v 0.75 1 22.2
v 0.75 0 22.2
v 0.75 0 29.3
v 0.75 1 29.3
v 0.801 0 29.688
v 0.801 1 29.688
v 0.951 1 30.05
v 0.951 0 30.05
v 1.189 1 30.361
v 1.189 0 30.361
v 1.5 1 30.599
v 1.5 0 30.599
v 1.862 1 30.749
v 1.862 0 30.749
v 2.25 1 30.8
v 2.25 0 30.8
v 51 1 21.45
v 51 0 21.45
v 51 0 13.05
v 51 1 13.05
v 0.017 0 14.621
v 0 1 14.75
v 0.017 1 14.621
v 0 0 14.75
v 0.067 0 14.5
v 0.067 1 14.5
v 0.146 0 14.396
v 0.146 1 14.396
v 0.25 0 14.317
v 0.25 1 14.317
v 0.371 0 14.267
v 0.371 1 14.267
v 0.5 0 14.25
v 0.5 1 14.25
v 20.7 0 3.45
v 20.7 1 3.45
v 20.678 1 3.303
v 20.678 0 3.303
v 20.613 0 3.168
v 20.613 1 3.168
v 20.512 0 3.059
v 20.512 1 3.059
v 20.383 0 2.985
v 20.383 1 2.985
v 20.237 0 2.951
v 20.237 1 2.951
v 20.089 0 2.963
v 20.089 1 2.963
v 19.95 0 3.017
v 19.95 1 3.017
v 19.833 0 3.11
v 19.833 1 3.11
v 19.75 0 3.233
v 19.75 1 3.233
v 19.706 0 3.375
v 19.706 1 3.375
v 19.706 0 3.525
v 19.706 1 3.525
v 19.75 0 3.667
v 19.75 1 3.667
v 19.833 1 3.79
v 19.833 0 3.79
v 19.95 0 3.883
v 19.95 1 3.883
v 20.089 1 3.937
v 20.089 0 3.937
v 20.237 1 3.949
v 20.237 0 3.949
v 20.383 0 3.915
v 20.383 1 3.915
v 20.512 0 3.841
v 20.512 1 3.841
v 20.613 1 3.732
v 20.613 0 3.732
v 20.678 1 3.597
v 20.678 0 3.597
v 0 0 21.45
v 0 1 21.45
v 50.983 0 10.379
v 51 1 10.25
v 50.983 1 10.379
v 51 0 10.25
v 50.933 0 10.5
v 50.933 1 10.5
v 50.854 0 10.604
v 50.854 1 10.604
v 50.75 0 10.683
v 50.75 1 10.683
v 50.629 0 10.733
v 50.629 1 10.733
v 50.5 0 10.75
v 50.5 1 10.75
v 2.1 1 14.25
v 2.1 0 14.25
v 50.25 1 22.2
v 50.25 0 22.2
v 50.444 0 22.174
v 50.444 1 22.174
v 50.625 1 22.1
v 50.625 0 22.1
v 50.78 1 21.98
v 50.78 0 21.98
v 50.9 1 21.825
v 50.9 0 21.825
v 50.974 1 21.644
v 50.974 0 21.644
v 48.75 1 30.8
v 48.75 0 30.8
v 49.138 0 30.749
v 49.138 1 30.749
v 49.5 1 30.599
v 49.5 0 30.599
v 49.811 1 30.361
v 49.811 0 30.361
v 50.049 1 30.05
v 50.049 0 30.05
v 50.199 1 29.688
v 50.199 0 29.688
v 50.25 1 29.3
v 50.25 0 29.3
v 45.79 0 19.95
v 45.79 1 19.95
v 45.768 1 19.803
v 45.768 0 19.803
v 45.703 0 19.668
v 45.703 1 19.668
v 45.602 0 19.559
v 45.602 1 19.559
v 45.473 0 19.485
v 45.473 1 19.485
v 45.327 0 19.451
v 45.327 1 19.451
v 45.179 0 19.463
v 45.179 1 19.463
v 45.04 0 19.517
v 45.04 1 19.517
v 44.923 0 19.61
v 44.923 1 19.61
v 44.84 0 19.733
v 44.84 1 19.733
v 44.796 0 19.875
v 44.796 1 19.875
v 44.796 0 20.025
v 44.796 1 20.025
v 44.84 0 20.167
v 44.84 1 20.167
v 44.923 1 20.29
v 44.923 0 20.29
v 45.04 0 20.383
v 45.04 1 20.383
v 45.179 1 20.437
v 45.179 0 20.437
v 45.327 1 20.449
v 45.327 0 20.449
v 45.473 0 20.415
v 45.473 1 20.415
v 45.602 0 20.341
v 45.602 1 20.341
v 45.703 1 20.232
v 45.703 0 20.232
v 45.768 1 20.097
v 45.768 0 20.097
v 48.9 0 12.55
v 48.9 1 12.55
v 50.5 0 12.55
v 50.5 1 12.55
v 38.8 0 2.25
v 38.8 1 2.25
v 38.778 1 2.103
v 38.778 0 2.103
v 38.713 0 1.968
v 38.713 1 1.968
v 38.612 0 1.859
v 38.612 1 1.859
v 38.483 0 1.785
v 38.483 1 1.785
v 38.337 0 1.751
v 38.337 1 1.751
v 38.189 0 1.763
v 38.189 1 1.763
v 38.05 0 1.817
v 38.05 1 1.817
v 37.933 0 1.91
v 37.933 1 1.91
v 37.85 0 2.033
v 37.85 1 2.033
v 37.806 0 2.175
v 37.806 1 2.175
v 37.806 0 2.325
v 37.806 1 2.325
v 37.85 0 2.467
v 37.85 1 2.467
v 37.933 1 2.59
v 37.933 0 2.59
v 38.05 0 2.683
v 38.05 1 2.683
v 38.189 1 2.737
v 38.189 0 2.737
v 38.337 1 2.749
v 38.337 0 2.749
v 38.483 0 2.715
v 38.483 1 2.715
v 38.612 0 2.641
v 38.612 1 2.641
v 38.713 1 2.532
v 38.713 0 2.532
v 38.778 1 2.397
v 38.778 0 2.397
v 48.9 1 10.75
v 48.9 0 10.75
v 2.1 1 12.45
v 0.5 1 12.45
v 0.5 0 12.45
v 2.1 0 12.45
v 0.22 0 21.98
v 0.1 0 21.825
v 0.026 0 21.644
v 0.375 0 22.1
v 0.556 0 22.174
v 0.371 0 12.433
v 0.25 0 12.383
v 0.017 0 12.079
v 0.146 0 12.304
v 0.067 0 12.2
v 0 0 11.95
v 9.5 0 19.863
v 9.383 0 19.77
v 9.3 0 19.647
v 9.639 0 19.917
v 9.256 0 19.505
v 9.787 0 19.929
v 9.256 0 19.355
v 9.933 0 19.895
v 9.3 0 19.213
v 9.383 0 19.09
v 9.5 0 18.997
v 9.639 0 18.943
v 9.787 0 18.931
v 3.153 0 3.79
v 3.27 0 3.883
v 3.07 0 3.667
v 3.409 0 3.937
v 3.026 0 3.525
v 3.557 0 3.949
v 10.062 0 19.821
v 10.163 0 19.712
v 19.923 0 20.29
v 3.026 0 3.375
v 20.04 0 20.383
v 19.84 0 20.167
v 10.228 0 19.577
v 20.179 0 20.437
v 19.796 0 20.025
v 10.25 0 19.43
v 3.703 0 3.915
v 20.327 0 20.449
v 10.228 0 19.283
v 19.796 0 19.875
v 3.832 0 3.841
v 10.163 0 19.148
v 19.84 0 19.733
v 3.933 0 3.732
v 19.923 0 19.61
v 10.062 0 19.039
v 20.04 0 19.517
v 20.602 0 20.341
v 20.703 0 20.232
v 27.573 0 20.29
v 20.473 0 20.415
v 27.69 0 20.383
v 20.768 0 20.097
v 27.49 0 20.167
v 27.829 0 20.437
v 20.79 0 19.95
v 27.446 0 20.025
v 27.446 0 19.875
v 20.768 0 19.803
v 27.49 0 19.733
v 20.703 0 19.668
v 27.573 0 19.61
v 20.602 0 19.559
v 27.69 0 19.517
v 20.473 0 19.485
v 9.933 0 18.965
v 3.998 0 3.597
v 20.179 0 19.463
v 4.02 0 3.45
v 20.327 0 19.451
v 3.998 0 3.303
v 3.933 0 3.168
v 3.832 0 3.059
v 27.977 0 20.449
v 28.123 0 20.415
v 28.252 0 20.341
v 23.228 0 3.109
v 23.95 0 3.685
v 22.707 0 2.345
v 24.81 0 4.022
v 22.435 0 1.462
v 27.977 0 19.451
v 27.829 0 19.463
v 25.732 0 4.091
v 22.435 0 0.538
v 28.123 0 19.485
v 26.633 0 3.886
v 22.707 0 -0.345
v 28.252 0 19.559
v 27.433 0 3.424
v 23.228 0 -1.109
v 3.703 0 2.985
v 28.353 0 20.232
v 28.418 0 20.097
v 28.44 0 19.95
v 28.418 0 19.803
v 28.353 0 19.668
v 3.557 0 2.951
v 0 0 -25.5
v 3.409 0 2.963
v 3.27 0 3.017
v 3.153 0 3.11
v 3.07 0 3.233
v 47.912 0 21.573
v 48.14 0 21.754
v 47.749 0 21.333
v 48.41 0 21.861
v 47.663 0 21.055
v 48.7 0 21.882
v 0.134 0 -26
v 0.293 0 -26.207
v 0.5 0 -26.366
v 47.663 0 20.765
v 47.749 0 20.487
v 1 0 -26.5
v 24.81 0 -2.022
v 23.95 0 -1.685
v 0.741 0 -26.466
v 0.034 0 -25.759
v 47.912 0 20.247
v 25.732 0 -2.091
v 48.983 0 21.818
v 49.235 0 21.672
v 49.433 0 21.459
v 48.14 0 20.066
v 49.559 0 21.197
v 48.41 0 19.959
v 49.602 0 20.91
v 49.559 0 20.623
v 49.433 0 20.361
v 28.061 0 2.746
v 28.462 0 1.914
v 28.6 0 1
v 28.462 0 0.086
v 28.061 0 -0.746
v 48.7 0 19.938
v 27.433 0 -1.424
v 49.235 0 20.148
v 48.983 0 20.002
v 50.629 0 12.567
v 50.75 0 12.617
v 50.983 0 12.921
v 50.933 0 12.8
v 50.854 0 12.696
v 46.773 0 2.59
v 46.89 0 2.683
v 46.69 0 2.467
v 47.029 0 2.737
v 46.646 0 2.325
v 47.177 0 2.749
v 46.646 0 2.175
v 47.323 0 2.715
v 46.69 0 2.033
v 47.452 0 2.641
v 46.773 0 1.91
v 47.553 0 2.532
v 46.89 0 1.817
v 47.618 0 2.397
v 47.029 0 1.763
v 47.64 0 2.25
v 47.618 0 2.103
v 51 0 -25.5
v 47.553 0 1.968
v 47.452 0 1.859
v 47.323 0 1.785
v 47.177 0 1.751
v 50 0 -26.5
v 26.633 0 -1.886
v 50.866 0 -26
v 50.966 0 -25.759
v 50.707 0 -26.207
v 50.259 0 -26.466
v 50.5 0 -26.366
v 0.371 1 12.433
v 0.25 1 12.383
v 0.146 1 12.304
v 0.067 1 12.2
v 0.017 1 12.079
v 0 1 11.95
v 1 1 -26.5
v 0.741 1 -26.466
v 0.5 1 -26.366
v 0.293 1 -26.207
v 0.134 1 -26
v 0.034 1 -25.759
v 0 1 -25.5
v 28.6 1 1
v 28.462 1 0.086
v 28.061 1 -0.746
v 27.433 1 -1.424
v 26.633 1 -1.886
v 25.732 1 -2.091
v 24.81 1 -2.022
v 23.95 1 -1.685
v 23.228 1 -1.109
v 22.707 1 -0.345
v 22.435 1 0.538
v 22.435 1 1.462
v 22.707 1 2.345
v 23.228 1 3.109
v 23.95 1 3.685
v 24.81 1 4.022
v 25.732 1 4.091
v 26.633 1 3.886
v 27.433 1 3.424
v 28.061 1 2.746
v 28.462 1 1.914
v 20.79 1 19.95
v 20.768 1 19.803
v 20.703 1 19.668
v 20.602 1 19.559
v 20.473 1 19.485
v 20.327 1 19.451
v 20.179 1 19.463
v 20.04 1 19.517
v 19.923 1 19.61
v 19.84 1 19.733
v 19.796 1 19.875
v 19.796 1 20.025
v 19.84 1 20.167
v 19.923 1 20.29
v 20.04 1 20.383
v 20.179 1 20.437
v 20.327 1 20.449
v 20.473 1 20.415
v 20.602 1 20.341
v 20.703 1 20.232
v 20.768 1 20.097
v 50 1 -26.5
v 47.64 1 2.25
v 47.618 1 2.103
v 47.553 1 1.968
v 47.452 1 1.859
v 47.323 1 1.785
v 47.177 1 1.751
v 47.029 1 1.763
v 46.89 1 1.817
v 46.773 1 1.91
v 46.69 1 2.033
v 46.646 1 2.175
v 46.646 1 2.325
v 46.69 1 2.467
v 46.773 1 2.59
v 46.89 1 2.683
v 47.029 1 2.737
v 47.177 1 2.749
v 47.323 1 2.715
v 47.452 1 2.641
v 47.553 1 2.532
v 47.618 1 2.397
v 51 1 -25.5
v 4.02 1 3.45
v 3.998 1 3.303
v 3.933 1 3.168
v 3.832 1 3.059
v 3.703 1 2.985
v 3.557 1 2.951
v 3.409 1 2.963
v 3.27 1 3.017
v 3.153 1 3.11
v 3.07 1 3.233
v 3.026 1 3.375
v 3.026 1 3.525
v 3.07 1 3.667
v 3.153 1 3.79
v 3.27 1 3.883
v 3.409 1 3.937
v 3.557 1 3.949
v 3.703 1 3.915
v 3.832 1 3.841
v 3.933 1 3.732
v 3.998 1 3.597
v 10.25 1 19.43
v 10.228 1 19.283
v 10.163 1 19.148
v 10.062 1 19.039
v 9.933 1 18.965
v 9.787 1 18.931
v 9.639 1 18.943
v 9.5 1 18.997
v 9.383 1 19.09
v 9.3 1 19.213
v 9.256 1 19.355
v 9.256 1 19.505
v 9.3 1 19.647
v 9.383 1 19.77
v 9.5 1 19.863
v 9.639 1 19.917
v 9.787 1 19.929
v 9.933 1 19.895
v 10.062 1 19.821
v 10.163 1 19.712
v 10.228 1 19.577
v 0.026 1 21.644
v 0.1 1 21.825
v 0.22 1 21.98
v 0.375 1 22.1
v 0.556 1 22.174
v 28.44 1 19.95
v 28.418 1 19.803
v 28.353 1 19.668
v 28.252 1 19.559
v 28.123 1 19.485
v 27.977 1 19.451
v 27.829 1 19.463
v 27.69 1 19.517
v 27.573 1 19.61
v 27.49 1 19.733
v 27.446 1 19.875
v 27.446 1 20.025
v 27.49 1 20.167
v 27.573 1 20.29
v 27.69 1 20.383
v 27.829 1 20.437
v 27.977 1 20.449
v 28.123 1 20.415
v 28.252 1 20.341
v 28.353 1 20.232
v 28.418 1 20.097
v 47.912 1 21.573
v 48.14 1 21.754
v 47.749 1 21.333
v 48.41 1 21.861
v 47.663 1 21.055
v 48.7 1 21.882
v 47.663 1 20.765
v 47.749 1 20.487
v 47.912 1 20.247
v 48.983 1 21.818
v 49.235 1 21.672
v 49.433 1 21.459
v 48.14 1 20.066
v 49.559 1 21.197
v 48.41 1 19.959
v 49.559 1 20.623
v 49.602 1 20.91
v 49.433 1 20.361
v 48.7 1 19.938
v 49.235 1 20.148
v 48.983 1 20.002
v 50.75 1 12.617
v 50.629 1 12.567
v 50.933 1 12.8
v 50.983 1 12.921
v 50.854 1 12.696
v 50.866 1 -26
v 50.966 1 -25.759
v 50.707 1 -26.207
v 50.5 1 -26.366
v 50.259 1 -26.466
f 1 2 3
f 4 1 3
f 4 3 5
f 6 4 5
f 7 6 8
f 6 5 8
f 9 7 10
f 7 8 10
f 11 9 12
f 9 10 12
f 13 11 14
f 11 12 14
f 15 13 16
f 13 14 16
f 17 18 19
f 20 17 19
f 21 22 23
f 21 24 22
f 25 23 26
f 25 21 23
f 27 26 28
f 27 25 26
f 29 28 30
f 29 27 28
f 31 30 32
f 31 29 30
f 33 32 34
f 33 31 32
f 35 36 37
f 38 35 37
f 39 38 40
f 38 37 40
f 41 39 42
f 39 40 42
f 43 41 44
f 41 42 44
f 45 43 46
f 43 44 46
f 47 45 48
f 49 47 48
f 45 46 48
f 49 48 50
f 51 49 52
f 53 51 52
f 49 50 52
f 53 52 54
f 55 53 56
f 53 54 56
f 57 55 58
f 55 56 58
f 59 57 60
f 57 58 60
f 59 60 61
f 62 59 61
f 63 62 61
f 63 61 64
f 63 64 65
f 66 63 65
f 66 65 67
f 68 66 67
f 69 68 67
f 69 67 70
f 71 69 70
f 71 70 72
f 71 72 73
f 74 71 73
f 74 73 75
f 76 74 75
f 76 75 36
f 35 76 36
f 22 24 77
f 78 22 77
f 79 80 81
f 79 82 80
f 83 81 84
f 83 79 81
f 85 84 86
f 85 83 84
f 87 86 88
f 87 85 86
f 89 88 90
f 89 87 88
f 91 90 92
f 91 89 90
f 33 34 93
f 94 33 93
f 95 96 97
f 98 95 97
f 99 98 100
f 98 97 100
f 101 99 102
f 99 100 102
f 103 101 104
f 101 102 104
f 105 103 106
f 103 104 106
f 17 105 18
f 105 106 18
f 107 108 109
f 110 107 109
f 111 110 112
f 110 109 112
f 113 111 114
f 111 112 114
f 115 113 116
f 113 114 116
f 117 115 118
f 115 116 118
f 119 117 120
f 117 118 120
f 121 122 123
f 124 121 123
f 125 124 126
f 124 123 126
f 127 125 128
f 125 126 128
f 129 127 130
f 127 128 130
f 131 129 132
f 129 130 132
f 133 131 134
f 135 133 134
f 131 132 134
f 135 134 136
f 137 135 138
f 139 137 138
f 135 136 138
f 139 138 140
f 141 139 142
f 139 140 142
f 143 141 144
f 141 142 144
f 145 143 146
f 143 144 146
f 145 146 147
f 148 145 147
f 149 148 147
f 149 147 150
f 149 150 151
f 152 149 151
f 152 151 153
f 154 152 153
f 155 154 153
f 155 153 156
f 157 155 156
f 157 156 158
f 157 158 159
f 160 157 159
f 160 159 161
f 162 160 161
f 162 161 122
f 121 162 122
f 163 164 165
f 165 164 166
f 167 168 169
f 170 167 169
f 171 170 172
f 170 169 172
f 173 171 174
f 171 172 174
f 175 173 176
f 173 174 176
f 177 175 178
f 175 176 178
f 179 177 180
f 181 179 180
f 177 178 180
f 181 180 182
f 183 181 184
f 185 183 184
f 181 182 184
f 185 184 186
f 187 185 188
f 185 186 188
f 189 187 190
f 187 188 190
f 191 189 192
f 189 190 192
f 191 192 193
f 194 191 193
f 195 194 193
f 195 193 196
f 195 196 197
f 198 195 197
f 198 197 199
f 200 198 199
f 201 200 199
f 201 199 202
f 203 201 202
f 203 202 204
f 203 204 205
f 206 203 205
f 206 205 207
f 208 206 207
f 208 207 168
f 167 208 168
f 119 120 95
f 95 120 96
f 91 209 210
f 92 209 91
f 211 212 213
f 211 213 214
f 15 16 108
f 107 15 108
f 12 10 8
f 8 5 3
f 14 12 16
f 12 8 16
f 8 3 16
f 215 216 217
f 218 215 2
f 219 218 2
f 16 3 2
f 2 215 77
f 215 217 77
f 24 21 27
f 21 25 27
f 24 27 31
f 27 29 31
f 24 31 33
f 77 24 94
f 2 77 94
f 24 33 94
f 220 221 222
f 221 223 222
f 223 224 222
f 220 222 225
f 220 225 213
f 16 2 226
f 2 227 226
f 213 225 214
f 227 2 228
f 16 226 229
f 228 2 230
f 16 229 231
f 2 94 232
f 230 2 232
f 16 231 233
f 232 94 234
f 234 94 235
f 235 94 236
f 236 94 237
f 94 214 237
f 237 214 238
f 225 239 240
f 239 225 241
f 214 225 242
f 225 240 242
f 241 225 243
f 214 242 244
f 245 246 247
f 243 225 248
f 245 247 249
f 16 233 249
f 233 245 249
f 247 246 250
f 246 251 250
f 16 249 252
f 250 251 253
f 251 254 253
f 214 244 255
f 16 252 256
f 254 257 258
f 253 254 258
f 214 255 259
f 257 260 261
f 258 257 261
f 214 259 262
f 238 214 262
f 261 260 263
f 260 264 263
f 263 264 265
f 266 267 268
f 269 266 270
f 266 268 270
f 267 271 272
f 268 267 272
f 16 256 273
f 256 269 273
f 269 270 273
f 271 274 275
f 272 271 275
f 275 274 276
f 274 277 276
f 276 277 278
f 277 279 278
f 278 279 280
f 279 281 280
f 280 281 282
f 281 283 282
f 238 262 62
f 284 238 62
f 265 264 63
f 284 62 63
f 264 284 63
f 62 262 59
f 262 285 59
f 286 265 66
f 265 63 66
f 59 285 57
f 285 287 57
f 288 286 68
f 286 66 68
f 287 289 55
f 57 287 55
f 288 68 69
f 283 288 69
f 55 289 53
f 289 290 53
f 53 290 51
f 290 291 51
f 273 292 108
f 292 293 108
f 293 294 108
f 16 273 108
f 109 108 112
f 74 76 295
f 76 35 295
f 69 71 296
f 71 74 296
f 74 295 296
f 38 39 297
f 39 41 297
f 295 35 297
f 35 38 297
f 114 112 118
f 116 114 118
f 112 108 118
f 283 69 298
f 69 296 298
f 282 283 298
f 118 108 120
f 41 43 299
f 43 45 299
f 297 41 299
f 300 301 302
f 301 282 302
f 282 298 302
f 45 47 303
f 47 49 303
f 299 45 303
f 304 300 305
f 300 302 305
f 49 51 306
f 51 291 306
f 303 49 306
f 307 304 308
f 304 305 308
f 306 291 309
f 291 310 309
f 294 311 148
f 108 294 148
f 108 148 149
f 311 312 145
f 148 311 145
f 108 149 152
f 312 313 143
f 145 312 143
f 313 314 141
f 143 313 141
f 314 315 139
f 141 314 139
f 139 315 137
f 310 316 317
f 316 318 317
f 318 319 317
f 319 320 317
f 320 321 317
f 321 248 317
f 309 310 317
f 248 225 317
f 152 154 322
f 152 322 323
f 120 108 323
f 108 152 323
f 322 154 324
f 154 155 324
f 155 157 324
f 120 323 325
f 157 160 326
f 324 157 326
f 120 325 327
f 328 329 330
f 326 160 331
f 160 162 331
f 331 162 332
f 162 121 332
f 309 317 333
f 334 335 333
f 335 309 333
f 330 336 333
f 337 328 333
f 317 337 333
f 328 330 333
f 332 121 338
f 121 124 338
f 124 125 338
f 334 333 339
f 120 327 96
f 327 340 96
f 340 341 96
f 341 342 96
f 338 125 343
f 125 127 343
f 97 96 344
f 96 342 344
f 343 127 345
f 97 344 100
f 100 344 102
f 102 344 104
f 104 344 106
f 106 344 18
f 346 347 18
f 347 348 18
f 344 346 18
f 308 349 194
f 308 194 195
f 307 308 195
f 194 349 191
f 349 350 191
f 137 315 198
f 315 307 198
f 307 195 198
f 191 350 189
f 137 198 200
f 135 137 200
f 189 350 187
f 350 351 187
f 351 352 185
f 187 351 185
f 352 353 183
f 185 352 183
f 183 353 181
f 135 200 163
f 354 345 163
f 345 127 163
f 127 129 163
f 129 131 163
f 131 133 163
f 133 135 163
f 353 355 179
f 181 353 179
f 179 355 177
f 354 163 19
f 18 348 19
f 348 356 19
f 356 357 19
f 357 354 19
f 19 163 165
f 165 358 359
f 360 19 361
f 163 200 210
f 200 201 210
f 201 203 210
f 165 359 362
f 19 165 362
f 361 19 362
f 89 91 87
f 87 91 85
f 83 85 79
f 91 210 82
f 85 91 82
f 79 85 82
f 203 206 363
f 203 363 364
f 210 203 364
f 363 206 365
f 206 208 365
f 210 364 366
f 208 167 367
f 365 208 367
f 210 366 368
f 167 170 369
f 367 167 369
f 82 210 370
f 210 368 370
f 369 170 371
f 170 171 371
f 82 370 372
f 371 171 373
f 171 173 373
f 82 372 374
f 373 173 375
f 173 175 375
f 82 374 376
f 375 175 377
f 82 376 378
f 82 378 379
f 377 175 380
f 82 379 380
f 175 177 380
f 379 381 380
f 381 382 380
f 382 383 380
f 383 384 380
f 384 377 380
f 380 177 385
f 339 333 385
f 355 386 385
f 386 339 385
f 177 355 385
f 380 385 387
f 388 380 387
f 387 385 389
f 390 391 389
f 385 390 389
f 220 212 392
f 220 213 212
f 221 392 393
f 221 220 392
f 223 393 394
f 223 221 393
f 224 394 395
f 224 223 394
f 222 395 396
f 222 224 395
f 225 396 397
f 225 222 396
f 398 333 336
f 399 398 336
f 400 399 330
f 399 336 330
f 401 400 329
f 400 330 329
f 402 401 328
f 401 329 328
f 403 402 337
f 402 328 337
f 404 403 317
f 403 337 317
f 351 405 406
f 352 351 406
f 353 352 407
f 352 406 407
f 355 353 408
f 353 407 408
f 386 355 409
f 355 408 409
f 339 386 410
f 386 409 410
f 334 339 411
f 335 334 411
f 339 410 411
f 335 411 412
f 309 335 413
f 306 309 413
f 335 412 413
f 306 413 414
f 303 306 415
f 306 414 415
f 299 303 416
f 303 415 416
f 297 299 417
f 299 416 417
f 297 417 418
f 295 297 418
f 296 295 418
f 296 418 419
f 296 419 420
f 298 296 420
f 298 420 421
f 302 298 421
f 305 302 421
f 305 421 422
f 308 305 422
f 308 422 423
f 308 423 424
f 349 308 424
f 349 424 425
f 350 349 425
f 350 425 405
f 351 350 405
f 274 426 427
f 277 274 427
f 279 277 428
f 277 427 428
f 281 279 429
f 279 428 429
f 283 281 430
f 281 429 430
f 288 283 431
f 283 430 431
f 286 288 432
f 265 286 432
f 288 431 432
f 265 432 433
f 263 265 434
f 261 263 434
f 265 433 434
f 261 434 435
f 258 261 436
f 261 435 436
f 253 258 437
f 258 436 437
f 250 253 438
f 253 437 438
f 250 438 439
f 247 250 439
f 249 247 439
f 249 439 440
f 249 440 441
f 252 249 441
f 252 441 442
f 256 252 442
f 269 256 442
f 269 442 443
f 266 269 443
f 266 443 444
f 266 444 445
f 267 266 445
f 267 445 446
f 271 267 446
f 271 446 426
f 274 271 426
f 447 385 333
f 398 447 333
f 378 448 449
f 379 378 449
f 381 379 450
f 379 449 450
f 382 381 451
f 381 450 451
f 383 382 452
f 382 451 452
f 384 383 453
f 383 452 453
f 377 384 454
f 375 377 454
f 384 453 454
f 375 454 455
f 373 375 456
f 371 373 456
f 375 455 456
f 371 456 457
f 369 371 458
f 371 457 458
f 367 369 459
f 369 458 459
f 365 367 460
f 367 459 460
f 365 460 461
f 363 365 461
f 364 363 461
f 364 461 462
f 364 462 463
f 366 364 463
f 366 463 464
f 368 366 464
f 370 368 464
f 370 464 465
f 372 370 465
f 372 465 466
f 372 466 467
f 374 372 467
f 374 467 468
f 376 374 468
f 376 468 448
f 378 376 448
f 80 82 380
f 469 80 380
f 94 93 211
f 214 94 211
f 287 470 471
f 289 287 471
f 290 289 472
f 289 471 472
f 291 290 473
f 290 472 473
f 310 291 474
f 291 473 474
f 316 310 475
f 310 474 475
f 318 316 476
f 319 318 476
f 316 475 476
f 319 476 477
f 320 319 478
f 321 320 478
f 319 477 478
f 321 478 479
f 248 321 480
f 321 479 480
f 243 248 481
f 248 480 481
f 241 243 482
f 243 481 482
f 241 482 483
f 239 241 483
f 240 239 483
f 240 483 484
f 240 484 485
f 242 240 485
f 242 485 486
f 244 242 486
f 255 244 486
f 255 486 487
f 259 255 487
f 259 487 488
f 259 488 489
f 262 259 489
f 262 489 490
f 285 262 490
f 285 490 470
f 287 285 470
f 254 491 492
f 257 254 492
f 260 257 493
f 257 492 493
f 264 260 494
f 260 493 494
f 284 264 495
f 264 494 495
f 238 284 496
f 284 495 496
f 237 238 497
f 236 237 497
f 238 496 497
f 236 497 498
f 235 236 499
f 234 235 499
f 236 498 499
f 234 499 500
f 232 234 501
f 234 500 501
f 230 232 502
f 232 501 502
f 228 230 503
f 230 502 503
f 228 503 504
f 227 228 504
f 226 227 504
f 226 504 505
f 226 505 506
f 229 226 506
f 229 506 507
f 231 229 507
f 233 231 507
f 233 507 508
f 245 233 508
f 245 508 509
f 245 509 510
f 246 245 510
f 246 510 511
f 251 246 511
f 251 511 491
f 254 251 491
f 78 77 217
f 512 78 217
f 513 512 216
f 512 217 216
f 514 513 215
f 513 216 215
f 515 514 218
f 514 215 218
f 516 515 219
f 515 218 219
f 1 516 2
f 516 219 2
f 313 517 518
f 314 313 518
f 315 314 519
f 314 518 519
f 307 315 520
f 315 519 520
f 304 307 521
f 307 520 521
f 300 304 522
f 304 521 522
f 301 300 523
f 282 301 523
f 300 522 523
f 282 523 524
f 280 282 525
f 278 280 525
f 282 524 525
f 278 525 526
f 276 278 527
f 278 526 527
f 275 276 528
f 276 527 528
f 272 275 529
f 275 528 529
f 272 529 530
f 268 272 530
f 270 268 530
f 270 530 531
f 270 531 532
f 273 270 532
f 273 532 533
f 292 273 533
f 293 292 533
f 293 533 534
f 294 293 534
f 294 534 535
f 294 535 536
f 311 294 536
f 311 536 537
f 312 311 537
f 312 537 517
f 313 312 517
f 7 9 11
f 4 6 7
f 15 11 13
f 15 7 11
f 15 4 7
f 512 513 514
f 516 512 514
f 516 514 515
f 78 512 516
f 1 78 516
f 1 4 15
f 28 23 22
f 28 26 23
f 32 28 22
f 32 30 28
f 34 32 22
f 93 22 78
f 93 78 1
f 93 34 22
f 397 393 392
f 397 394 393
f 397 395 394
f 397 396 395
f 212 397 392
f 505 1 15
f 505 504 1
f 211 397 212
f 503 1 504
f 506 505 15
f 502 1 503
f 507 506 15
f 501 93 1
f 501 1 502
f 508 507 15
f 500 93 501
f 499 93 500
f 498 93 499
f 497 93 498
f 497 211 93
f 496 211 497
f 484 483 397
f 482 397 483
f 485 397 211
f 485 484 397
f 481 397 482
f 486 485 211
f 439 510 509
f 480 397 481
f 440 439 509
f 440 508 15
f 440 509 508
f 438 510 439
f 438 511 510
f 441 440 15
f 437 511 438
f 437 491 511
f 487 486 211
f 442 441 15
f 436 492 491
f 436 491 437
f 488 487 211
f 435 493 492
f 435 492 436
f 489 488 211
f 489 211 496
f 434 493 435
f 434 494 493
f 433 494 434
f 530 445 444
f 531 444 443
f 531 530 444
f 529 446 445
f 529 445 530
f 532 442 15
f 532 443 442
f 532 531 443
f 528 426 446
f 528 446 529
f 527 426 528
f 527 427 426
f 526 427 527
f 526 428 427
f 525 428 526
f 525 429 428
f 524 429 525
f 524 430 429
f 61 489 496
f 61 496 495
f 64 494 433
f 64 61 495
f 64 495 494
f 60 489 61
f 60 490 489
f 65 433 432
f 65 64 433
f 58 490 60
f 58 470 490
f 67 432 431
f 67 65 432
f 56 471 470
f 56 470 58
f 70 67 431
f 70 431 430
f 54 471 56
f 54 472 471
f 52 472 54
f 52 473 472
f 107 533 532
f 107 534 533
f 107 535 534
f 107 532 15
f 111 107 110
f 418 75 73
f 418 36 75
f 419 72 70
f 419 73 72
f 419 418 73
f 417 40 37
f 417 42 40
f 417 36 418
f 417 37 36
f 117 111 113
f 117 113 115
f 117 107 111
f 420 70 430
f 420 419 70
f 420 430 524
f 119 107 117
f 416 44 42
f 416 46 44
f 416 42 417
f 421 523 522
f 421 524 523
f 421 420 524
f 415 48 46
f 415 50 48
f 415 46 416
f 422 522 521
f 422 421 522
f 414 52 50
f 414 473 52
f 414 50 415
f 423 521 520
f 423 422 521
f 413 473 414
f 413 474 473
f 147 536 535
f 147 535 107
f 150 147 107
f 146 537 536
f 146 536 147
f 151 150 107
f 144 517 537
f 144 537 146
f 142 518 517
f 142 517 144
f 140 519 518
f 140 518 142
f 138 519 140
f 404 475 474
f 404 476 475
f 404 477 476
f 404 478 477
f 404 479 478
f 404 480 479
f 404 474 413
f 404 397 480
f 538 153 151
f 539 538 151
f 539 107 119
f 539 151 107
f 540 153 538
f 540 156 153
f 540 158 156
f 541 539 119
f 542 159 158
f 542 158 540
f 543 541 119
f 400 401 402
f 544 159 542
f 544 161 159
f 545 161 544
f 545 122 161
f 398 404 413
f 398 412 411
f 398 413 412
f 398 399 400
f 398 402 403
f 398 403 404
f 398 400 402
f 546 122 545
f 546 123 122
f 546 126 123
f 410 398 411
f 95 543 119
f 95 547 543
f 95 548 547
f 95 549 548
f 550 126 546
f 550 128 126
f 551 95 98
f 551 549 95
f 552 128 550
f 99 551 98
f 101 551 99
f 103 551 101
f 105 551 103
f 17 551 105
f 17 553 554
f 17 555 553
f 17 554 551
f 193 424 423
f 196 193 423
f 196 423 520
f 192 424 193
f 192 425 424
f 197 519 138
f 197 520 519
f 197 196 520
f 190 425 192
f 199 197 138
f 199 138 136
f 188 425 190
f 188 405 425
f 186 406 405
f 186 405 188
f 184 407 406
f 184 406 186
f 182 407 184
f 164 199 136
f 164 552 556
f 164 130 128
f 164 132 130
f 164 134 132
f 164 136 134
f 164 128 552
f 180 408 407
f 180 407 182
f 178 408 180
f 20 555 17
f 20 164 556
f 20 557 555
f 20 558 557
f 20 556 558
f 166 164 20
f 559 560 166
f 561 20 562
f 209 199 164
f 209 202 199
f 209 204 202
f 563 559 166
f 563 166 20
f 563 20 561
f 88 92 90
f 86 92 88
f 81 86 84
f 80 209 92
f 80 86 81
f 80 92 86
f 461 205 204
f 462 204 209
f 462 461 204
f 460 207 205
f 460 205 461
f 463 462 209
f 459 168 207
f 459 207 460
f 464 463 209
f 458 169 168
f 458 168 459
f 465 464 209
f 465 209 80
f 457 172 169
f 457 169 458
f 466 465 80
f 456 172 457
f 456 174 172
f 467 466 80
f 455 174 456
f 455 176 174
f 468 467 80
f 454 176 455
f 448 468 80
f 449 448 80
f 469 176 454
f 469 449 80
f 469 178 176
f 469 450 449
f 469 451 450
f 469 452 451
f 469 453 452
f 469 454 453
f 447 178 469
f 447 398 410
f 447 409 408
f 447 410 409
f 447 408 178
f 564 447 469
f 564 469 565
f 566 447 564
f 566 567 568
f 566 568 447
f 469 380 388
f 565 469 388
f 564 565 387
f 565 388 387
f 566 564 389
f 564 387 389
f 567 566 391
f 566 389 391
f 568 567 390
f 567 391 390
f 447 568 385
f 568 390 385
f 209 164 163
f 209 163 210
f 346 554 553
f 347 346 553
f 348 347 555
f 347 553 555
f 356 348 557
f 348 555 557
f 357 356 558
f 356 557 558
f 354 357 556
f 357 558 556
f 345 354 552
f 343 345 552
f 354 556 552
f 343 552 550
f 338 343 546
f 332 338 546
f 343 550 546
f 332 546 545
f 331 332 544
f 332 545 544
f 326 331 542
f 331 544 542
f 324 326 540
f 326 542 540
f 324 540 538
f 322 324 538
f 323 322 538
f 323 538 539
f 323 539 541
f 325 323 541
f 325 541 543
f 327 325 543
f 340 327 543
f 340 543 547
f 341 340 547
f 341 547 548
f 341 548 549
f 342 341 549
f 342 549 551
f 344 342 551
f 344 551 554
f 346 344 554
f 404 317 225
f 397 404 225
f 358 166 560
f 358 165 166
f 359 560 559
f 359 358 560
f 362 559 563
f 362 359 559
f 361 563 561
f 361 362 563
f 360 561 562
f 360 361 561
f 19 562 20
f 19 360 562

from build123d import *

# Parameters (mm, degrees)
BOSS_EXTRUDE1_DEPTH     = 1
SKETCH2_W               = 2.1
SKETCH2_H               = 1.8
CUT_EXTRUDE1_DEPTH      = 1
CUT_EXTRUDE1_DEPTH_BACK = 2
FILLET1_R               = 0.5
SKETCH3_R               = 0.5
SKETCH3_R_2             = 0.975
CUT_EXTRUDE2_DEPTH      = 1
CUT_EXTRUDE2_DEPTH_BACK = 2


with BuildPart() as part:
    # Sketch1 → Boss-Extrude1 (new body)
    with BuildSketch(Plane(origin=(0, 0, 0), x_dir=(1, 0, 0), z_dir=(0, 1, 0))):
        with BuildLine():
            Line((0, -1), (0, -21.45))
            ThreePointArc((0, -21.45), (0.219669914, -21.980330086), (0.75, -22.2))
            Line((0.75, -22.2), (0.75, -29.3))
            ThreePointArc((0.75, -29.3), (1.189339828, -30.360660172), (2.25, -30.8))
            Line((2.25, -30.8), (48.75, -30.8))
            ThreePointArc((48.75, -30.8), (49.810660172, -30.360660172), (50.25, -29.3))
            Line((50.25, -29.3), (50.25, -22.2))
            ThreePointArc((50.25, -22.2), (50.780330086, -21.980330086), (51, -21.45))
            Line((51, -21.45), (51, -1))
            Line((51, -1), (51, 25.5))
            ThreePointArc((51, 25.5), (50.707106781, 26.207106781), (50, 26.5))
            Line((50, 26.5), (1, 26.5))
            ThreePointArc((1, 26.5), (0.292893219, 26.207106781), (0, 25.5))
            Line((0, 25.5), (0, -1))
        make_face()
    extrude(amount=BOSS_EXTRUDE1_DEPTH)

    # Sketch2 → Cut-Extrude1 (cut, two sides)
    with BuildSketch(Plane(origin=(0, 1, 0), x_dir=(1, 0, 0), z_dir=(0, 1, 0))) as cut_extrude1_sk:
        with Locations((1.05, -13.35)):
            Rectangle(SKETCH2_W, SKETCH2_H)
        with BuildLine():
            ThreePointArc((22.4, -1), (25.5, -4.1), (28.6, -1))
            ThreePointArc((28.6, -1), (25.5, 2.1), (22.4, -1))
        make_face()
        with Locations((49.95, -11.65)):
            Rectangle(SKETCH2_W, SKETCH2_H)
    extrude(amount=CUT_EXTRUDE1_DEPTH, mode=Mode.SUBTRACT)
    extrude(cut_extrude1_sk.sketch, amount=-CUT_EXTRUDE1_DEPTH_BACK, mode=Mode.SUBTRACT)

    # Fillet1
    fillet1_edges = [part.edges().sort_by_distance(p)[0] for p in [
        (0, 0.5, 14.25),
        (0, 0.5, 12.45),
        (51, 0.5, 10.75),
        (51, 0.5, 12.55),
    ]]
    fillet(fillet1_edges, radius=FILLET1_R)

    # Sketch3 → Cut-Extrude2 (cut, two sides)
    with BuildSketch(Plane(origin=(0, 1, 0), x_dir=(1, 0, 0), z_dir=(0, 1, 0))) as cut_extrude2_sk:
        with Locations((3.52, -3.45)):
            Circle(SKETCH3_R)
        with Locations((20.2, -3.45)):
            Circle(SKETCH3_R)
        with Locations((38.3, -2.25)):
            Circle(SKETCH3_R)
        with Locations((47.14, -2.25)):
            Circle(SKETCH3_R)
        with Locations((48.627, -20.91)):
            Circle(SKETCH3_R_2)
        with Locations((45.29, -19.95)):
            Circle(SKETCH3_R)
        with Locations((27.94, -19.95)):
            Circle(SKETCH3_R)
        with Locations((20.29, -19.95)):
            Circle(SKETCH3_R)
        with Locations((9.75, -19.43)):
            Circle(SKETCH3_R)
    extrude(amount=CUT_EXTRUDE2_DEPTH, mode=Mode.SUBTRACT)
    extrude(cut_extrude2_sk.sketch, amount=-CUT_EXTRUDE2_DEPTH_BACK, mode=Mode.SUBTRACT)


solid = part.part
